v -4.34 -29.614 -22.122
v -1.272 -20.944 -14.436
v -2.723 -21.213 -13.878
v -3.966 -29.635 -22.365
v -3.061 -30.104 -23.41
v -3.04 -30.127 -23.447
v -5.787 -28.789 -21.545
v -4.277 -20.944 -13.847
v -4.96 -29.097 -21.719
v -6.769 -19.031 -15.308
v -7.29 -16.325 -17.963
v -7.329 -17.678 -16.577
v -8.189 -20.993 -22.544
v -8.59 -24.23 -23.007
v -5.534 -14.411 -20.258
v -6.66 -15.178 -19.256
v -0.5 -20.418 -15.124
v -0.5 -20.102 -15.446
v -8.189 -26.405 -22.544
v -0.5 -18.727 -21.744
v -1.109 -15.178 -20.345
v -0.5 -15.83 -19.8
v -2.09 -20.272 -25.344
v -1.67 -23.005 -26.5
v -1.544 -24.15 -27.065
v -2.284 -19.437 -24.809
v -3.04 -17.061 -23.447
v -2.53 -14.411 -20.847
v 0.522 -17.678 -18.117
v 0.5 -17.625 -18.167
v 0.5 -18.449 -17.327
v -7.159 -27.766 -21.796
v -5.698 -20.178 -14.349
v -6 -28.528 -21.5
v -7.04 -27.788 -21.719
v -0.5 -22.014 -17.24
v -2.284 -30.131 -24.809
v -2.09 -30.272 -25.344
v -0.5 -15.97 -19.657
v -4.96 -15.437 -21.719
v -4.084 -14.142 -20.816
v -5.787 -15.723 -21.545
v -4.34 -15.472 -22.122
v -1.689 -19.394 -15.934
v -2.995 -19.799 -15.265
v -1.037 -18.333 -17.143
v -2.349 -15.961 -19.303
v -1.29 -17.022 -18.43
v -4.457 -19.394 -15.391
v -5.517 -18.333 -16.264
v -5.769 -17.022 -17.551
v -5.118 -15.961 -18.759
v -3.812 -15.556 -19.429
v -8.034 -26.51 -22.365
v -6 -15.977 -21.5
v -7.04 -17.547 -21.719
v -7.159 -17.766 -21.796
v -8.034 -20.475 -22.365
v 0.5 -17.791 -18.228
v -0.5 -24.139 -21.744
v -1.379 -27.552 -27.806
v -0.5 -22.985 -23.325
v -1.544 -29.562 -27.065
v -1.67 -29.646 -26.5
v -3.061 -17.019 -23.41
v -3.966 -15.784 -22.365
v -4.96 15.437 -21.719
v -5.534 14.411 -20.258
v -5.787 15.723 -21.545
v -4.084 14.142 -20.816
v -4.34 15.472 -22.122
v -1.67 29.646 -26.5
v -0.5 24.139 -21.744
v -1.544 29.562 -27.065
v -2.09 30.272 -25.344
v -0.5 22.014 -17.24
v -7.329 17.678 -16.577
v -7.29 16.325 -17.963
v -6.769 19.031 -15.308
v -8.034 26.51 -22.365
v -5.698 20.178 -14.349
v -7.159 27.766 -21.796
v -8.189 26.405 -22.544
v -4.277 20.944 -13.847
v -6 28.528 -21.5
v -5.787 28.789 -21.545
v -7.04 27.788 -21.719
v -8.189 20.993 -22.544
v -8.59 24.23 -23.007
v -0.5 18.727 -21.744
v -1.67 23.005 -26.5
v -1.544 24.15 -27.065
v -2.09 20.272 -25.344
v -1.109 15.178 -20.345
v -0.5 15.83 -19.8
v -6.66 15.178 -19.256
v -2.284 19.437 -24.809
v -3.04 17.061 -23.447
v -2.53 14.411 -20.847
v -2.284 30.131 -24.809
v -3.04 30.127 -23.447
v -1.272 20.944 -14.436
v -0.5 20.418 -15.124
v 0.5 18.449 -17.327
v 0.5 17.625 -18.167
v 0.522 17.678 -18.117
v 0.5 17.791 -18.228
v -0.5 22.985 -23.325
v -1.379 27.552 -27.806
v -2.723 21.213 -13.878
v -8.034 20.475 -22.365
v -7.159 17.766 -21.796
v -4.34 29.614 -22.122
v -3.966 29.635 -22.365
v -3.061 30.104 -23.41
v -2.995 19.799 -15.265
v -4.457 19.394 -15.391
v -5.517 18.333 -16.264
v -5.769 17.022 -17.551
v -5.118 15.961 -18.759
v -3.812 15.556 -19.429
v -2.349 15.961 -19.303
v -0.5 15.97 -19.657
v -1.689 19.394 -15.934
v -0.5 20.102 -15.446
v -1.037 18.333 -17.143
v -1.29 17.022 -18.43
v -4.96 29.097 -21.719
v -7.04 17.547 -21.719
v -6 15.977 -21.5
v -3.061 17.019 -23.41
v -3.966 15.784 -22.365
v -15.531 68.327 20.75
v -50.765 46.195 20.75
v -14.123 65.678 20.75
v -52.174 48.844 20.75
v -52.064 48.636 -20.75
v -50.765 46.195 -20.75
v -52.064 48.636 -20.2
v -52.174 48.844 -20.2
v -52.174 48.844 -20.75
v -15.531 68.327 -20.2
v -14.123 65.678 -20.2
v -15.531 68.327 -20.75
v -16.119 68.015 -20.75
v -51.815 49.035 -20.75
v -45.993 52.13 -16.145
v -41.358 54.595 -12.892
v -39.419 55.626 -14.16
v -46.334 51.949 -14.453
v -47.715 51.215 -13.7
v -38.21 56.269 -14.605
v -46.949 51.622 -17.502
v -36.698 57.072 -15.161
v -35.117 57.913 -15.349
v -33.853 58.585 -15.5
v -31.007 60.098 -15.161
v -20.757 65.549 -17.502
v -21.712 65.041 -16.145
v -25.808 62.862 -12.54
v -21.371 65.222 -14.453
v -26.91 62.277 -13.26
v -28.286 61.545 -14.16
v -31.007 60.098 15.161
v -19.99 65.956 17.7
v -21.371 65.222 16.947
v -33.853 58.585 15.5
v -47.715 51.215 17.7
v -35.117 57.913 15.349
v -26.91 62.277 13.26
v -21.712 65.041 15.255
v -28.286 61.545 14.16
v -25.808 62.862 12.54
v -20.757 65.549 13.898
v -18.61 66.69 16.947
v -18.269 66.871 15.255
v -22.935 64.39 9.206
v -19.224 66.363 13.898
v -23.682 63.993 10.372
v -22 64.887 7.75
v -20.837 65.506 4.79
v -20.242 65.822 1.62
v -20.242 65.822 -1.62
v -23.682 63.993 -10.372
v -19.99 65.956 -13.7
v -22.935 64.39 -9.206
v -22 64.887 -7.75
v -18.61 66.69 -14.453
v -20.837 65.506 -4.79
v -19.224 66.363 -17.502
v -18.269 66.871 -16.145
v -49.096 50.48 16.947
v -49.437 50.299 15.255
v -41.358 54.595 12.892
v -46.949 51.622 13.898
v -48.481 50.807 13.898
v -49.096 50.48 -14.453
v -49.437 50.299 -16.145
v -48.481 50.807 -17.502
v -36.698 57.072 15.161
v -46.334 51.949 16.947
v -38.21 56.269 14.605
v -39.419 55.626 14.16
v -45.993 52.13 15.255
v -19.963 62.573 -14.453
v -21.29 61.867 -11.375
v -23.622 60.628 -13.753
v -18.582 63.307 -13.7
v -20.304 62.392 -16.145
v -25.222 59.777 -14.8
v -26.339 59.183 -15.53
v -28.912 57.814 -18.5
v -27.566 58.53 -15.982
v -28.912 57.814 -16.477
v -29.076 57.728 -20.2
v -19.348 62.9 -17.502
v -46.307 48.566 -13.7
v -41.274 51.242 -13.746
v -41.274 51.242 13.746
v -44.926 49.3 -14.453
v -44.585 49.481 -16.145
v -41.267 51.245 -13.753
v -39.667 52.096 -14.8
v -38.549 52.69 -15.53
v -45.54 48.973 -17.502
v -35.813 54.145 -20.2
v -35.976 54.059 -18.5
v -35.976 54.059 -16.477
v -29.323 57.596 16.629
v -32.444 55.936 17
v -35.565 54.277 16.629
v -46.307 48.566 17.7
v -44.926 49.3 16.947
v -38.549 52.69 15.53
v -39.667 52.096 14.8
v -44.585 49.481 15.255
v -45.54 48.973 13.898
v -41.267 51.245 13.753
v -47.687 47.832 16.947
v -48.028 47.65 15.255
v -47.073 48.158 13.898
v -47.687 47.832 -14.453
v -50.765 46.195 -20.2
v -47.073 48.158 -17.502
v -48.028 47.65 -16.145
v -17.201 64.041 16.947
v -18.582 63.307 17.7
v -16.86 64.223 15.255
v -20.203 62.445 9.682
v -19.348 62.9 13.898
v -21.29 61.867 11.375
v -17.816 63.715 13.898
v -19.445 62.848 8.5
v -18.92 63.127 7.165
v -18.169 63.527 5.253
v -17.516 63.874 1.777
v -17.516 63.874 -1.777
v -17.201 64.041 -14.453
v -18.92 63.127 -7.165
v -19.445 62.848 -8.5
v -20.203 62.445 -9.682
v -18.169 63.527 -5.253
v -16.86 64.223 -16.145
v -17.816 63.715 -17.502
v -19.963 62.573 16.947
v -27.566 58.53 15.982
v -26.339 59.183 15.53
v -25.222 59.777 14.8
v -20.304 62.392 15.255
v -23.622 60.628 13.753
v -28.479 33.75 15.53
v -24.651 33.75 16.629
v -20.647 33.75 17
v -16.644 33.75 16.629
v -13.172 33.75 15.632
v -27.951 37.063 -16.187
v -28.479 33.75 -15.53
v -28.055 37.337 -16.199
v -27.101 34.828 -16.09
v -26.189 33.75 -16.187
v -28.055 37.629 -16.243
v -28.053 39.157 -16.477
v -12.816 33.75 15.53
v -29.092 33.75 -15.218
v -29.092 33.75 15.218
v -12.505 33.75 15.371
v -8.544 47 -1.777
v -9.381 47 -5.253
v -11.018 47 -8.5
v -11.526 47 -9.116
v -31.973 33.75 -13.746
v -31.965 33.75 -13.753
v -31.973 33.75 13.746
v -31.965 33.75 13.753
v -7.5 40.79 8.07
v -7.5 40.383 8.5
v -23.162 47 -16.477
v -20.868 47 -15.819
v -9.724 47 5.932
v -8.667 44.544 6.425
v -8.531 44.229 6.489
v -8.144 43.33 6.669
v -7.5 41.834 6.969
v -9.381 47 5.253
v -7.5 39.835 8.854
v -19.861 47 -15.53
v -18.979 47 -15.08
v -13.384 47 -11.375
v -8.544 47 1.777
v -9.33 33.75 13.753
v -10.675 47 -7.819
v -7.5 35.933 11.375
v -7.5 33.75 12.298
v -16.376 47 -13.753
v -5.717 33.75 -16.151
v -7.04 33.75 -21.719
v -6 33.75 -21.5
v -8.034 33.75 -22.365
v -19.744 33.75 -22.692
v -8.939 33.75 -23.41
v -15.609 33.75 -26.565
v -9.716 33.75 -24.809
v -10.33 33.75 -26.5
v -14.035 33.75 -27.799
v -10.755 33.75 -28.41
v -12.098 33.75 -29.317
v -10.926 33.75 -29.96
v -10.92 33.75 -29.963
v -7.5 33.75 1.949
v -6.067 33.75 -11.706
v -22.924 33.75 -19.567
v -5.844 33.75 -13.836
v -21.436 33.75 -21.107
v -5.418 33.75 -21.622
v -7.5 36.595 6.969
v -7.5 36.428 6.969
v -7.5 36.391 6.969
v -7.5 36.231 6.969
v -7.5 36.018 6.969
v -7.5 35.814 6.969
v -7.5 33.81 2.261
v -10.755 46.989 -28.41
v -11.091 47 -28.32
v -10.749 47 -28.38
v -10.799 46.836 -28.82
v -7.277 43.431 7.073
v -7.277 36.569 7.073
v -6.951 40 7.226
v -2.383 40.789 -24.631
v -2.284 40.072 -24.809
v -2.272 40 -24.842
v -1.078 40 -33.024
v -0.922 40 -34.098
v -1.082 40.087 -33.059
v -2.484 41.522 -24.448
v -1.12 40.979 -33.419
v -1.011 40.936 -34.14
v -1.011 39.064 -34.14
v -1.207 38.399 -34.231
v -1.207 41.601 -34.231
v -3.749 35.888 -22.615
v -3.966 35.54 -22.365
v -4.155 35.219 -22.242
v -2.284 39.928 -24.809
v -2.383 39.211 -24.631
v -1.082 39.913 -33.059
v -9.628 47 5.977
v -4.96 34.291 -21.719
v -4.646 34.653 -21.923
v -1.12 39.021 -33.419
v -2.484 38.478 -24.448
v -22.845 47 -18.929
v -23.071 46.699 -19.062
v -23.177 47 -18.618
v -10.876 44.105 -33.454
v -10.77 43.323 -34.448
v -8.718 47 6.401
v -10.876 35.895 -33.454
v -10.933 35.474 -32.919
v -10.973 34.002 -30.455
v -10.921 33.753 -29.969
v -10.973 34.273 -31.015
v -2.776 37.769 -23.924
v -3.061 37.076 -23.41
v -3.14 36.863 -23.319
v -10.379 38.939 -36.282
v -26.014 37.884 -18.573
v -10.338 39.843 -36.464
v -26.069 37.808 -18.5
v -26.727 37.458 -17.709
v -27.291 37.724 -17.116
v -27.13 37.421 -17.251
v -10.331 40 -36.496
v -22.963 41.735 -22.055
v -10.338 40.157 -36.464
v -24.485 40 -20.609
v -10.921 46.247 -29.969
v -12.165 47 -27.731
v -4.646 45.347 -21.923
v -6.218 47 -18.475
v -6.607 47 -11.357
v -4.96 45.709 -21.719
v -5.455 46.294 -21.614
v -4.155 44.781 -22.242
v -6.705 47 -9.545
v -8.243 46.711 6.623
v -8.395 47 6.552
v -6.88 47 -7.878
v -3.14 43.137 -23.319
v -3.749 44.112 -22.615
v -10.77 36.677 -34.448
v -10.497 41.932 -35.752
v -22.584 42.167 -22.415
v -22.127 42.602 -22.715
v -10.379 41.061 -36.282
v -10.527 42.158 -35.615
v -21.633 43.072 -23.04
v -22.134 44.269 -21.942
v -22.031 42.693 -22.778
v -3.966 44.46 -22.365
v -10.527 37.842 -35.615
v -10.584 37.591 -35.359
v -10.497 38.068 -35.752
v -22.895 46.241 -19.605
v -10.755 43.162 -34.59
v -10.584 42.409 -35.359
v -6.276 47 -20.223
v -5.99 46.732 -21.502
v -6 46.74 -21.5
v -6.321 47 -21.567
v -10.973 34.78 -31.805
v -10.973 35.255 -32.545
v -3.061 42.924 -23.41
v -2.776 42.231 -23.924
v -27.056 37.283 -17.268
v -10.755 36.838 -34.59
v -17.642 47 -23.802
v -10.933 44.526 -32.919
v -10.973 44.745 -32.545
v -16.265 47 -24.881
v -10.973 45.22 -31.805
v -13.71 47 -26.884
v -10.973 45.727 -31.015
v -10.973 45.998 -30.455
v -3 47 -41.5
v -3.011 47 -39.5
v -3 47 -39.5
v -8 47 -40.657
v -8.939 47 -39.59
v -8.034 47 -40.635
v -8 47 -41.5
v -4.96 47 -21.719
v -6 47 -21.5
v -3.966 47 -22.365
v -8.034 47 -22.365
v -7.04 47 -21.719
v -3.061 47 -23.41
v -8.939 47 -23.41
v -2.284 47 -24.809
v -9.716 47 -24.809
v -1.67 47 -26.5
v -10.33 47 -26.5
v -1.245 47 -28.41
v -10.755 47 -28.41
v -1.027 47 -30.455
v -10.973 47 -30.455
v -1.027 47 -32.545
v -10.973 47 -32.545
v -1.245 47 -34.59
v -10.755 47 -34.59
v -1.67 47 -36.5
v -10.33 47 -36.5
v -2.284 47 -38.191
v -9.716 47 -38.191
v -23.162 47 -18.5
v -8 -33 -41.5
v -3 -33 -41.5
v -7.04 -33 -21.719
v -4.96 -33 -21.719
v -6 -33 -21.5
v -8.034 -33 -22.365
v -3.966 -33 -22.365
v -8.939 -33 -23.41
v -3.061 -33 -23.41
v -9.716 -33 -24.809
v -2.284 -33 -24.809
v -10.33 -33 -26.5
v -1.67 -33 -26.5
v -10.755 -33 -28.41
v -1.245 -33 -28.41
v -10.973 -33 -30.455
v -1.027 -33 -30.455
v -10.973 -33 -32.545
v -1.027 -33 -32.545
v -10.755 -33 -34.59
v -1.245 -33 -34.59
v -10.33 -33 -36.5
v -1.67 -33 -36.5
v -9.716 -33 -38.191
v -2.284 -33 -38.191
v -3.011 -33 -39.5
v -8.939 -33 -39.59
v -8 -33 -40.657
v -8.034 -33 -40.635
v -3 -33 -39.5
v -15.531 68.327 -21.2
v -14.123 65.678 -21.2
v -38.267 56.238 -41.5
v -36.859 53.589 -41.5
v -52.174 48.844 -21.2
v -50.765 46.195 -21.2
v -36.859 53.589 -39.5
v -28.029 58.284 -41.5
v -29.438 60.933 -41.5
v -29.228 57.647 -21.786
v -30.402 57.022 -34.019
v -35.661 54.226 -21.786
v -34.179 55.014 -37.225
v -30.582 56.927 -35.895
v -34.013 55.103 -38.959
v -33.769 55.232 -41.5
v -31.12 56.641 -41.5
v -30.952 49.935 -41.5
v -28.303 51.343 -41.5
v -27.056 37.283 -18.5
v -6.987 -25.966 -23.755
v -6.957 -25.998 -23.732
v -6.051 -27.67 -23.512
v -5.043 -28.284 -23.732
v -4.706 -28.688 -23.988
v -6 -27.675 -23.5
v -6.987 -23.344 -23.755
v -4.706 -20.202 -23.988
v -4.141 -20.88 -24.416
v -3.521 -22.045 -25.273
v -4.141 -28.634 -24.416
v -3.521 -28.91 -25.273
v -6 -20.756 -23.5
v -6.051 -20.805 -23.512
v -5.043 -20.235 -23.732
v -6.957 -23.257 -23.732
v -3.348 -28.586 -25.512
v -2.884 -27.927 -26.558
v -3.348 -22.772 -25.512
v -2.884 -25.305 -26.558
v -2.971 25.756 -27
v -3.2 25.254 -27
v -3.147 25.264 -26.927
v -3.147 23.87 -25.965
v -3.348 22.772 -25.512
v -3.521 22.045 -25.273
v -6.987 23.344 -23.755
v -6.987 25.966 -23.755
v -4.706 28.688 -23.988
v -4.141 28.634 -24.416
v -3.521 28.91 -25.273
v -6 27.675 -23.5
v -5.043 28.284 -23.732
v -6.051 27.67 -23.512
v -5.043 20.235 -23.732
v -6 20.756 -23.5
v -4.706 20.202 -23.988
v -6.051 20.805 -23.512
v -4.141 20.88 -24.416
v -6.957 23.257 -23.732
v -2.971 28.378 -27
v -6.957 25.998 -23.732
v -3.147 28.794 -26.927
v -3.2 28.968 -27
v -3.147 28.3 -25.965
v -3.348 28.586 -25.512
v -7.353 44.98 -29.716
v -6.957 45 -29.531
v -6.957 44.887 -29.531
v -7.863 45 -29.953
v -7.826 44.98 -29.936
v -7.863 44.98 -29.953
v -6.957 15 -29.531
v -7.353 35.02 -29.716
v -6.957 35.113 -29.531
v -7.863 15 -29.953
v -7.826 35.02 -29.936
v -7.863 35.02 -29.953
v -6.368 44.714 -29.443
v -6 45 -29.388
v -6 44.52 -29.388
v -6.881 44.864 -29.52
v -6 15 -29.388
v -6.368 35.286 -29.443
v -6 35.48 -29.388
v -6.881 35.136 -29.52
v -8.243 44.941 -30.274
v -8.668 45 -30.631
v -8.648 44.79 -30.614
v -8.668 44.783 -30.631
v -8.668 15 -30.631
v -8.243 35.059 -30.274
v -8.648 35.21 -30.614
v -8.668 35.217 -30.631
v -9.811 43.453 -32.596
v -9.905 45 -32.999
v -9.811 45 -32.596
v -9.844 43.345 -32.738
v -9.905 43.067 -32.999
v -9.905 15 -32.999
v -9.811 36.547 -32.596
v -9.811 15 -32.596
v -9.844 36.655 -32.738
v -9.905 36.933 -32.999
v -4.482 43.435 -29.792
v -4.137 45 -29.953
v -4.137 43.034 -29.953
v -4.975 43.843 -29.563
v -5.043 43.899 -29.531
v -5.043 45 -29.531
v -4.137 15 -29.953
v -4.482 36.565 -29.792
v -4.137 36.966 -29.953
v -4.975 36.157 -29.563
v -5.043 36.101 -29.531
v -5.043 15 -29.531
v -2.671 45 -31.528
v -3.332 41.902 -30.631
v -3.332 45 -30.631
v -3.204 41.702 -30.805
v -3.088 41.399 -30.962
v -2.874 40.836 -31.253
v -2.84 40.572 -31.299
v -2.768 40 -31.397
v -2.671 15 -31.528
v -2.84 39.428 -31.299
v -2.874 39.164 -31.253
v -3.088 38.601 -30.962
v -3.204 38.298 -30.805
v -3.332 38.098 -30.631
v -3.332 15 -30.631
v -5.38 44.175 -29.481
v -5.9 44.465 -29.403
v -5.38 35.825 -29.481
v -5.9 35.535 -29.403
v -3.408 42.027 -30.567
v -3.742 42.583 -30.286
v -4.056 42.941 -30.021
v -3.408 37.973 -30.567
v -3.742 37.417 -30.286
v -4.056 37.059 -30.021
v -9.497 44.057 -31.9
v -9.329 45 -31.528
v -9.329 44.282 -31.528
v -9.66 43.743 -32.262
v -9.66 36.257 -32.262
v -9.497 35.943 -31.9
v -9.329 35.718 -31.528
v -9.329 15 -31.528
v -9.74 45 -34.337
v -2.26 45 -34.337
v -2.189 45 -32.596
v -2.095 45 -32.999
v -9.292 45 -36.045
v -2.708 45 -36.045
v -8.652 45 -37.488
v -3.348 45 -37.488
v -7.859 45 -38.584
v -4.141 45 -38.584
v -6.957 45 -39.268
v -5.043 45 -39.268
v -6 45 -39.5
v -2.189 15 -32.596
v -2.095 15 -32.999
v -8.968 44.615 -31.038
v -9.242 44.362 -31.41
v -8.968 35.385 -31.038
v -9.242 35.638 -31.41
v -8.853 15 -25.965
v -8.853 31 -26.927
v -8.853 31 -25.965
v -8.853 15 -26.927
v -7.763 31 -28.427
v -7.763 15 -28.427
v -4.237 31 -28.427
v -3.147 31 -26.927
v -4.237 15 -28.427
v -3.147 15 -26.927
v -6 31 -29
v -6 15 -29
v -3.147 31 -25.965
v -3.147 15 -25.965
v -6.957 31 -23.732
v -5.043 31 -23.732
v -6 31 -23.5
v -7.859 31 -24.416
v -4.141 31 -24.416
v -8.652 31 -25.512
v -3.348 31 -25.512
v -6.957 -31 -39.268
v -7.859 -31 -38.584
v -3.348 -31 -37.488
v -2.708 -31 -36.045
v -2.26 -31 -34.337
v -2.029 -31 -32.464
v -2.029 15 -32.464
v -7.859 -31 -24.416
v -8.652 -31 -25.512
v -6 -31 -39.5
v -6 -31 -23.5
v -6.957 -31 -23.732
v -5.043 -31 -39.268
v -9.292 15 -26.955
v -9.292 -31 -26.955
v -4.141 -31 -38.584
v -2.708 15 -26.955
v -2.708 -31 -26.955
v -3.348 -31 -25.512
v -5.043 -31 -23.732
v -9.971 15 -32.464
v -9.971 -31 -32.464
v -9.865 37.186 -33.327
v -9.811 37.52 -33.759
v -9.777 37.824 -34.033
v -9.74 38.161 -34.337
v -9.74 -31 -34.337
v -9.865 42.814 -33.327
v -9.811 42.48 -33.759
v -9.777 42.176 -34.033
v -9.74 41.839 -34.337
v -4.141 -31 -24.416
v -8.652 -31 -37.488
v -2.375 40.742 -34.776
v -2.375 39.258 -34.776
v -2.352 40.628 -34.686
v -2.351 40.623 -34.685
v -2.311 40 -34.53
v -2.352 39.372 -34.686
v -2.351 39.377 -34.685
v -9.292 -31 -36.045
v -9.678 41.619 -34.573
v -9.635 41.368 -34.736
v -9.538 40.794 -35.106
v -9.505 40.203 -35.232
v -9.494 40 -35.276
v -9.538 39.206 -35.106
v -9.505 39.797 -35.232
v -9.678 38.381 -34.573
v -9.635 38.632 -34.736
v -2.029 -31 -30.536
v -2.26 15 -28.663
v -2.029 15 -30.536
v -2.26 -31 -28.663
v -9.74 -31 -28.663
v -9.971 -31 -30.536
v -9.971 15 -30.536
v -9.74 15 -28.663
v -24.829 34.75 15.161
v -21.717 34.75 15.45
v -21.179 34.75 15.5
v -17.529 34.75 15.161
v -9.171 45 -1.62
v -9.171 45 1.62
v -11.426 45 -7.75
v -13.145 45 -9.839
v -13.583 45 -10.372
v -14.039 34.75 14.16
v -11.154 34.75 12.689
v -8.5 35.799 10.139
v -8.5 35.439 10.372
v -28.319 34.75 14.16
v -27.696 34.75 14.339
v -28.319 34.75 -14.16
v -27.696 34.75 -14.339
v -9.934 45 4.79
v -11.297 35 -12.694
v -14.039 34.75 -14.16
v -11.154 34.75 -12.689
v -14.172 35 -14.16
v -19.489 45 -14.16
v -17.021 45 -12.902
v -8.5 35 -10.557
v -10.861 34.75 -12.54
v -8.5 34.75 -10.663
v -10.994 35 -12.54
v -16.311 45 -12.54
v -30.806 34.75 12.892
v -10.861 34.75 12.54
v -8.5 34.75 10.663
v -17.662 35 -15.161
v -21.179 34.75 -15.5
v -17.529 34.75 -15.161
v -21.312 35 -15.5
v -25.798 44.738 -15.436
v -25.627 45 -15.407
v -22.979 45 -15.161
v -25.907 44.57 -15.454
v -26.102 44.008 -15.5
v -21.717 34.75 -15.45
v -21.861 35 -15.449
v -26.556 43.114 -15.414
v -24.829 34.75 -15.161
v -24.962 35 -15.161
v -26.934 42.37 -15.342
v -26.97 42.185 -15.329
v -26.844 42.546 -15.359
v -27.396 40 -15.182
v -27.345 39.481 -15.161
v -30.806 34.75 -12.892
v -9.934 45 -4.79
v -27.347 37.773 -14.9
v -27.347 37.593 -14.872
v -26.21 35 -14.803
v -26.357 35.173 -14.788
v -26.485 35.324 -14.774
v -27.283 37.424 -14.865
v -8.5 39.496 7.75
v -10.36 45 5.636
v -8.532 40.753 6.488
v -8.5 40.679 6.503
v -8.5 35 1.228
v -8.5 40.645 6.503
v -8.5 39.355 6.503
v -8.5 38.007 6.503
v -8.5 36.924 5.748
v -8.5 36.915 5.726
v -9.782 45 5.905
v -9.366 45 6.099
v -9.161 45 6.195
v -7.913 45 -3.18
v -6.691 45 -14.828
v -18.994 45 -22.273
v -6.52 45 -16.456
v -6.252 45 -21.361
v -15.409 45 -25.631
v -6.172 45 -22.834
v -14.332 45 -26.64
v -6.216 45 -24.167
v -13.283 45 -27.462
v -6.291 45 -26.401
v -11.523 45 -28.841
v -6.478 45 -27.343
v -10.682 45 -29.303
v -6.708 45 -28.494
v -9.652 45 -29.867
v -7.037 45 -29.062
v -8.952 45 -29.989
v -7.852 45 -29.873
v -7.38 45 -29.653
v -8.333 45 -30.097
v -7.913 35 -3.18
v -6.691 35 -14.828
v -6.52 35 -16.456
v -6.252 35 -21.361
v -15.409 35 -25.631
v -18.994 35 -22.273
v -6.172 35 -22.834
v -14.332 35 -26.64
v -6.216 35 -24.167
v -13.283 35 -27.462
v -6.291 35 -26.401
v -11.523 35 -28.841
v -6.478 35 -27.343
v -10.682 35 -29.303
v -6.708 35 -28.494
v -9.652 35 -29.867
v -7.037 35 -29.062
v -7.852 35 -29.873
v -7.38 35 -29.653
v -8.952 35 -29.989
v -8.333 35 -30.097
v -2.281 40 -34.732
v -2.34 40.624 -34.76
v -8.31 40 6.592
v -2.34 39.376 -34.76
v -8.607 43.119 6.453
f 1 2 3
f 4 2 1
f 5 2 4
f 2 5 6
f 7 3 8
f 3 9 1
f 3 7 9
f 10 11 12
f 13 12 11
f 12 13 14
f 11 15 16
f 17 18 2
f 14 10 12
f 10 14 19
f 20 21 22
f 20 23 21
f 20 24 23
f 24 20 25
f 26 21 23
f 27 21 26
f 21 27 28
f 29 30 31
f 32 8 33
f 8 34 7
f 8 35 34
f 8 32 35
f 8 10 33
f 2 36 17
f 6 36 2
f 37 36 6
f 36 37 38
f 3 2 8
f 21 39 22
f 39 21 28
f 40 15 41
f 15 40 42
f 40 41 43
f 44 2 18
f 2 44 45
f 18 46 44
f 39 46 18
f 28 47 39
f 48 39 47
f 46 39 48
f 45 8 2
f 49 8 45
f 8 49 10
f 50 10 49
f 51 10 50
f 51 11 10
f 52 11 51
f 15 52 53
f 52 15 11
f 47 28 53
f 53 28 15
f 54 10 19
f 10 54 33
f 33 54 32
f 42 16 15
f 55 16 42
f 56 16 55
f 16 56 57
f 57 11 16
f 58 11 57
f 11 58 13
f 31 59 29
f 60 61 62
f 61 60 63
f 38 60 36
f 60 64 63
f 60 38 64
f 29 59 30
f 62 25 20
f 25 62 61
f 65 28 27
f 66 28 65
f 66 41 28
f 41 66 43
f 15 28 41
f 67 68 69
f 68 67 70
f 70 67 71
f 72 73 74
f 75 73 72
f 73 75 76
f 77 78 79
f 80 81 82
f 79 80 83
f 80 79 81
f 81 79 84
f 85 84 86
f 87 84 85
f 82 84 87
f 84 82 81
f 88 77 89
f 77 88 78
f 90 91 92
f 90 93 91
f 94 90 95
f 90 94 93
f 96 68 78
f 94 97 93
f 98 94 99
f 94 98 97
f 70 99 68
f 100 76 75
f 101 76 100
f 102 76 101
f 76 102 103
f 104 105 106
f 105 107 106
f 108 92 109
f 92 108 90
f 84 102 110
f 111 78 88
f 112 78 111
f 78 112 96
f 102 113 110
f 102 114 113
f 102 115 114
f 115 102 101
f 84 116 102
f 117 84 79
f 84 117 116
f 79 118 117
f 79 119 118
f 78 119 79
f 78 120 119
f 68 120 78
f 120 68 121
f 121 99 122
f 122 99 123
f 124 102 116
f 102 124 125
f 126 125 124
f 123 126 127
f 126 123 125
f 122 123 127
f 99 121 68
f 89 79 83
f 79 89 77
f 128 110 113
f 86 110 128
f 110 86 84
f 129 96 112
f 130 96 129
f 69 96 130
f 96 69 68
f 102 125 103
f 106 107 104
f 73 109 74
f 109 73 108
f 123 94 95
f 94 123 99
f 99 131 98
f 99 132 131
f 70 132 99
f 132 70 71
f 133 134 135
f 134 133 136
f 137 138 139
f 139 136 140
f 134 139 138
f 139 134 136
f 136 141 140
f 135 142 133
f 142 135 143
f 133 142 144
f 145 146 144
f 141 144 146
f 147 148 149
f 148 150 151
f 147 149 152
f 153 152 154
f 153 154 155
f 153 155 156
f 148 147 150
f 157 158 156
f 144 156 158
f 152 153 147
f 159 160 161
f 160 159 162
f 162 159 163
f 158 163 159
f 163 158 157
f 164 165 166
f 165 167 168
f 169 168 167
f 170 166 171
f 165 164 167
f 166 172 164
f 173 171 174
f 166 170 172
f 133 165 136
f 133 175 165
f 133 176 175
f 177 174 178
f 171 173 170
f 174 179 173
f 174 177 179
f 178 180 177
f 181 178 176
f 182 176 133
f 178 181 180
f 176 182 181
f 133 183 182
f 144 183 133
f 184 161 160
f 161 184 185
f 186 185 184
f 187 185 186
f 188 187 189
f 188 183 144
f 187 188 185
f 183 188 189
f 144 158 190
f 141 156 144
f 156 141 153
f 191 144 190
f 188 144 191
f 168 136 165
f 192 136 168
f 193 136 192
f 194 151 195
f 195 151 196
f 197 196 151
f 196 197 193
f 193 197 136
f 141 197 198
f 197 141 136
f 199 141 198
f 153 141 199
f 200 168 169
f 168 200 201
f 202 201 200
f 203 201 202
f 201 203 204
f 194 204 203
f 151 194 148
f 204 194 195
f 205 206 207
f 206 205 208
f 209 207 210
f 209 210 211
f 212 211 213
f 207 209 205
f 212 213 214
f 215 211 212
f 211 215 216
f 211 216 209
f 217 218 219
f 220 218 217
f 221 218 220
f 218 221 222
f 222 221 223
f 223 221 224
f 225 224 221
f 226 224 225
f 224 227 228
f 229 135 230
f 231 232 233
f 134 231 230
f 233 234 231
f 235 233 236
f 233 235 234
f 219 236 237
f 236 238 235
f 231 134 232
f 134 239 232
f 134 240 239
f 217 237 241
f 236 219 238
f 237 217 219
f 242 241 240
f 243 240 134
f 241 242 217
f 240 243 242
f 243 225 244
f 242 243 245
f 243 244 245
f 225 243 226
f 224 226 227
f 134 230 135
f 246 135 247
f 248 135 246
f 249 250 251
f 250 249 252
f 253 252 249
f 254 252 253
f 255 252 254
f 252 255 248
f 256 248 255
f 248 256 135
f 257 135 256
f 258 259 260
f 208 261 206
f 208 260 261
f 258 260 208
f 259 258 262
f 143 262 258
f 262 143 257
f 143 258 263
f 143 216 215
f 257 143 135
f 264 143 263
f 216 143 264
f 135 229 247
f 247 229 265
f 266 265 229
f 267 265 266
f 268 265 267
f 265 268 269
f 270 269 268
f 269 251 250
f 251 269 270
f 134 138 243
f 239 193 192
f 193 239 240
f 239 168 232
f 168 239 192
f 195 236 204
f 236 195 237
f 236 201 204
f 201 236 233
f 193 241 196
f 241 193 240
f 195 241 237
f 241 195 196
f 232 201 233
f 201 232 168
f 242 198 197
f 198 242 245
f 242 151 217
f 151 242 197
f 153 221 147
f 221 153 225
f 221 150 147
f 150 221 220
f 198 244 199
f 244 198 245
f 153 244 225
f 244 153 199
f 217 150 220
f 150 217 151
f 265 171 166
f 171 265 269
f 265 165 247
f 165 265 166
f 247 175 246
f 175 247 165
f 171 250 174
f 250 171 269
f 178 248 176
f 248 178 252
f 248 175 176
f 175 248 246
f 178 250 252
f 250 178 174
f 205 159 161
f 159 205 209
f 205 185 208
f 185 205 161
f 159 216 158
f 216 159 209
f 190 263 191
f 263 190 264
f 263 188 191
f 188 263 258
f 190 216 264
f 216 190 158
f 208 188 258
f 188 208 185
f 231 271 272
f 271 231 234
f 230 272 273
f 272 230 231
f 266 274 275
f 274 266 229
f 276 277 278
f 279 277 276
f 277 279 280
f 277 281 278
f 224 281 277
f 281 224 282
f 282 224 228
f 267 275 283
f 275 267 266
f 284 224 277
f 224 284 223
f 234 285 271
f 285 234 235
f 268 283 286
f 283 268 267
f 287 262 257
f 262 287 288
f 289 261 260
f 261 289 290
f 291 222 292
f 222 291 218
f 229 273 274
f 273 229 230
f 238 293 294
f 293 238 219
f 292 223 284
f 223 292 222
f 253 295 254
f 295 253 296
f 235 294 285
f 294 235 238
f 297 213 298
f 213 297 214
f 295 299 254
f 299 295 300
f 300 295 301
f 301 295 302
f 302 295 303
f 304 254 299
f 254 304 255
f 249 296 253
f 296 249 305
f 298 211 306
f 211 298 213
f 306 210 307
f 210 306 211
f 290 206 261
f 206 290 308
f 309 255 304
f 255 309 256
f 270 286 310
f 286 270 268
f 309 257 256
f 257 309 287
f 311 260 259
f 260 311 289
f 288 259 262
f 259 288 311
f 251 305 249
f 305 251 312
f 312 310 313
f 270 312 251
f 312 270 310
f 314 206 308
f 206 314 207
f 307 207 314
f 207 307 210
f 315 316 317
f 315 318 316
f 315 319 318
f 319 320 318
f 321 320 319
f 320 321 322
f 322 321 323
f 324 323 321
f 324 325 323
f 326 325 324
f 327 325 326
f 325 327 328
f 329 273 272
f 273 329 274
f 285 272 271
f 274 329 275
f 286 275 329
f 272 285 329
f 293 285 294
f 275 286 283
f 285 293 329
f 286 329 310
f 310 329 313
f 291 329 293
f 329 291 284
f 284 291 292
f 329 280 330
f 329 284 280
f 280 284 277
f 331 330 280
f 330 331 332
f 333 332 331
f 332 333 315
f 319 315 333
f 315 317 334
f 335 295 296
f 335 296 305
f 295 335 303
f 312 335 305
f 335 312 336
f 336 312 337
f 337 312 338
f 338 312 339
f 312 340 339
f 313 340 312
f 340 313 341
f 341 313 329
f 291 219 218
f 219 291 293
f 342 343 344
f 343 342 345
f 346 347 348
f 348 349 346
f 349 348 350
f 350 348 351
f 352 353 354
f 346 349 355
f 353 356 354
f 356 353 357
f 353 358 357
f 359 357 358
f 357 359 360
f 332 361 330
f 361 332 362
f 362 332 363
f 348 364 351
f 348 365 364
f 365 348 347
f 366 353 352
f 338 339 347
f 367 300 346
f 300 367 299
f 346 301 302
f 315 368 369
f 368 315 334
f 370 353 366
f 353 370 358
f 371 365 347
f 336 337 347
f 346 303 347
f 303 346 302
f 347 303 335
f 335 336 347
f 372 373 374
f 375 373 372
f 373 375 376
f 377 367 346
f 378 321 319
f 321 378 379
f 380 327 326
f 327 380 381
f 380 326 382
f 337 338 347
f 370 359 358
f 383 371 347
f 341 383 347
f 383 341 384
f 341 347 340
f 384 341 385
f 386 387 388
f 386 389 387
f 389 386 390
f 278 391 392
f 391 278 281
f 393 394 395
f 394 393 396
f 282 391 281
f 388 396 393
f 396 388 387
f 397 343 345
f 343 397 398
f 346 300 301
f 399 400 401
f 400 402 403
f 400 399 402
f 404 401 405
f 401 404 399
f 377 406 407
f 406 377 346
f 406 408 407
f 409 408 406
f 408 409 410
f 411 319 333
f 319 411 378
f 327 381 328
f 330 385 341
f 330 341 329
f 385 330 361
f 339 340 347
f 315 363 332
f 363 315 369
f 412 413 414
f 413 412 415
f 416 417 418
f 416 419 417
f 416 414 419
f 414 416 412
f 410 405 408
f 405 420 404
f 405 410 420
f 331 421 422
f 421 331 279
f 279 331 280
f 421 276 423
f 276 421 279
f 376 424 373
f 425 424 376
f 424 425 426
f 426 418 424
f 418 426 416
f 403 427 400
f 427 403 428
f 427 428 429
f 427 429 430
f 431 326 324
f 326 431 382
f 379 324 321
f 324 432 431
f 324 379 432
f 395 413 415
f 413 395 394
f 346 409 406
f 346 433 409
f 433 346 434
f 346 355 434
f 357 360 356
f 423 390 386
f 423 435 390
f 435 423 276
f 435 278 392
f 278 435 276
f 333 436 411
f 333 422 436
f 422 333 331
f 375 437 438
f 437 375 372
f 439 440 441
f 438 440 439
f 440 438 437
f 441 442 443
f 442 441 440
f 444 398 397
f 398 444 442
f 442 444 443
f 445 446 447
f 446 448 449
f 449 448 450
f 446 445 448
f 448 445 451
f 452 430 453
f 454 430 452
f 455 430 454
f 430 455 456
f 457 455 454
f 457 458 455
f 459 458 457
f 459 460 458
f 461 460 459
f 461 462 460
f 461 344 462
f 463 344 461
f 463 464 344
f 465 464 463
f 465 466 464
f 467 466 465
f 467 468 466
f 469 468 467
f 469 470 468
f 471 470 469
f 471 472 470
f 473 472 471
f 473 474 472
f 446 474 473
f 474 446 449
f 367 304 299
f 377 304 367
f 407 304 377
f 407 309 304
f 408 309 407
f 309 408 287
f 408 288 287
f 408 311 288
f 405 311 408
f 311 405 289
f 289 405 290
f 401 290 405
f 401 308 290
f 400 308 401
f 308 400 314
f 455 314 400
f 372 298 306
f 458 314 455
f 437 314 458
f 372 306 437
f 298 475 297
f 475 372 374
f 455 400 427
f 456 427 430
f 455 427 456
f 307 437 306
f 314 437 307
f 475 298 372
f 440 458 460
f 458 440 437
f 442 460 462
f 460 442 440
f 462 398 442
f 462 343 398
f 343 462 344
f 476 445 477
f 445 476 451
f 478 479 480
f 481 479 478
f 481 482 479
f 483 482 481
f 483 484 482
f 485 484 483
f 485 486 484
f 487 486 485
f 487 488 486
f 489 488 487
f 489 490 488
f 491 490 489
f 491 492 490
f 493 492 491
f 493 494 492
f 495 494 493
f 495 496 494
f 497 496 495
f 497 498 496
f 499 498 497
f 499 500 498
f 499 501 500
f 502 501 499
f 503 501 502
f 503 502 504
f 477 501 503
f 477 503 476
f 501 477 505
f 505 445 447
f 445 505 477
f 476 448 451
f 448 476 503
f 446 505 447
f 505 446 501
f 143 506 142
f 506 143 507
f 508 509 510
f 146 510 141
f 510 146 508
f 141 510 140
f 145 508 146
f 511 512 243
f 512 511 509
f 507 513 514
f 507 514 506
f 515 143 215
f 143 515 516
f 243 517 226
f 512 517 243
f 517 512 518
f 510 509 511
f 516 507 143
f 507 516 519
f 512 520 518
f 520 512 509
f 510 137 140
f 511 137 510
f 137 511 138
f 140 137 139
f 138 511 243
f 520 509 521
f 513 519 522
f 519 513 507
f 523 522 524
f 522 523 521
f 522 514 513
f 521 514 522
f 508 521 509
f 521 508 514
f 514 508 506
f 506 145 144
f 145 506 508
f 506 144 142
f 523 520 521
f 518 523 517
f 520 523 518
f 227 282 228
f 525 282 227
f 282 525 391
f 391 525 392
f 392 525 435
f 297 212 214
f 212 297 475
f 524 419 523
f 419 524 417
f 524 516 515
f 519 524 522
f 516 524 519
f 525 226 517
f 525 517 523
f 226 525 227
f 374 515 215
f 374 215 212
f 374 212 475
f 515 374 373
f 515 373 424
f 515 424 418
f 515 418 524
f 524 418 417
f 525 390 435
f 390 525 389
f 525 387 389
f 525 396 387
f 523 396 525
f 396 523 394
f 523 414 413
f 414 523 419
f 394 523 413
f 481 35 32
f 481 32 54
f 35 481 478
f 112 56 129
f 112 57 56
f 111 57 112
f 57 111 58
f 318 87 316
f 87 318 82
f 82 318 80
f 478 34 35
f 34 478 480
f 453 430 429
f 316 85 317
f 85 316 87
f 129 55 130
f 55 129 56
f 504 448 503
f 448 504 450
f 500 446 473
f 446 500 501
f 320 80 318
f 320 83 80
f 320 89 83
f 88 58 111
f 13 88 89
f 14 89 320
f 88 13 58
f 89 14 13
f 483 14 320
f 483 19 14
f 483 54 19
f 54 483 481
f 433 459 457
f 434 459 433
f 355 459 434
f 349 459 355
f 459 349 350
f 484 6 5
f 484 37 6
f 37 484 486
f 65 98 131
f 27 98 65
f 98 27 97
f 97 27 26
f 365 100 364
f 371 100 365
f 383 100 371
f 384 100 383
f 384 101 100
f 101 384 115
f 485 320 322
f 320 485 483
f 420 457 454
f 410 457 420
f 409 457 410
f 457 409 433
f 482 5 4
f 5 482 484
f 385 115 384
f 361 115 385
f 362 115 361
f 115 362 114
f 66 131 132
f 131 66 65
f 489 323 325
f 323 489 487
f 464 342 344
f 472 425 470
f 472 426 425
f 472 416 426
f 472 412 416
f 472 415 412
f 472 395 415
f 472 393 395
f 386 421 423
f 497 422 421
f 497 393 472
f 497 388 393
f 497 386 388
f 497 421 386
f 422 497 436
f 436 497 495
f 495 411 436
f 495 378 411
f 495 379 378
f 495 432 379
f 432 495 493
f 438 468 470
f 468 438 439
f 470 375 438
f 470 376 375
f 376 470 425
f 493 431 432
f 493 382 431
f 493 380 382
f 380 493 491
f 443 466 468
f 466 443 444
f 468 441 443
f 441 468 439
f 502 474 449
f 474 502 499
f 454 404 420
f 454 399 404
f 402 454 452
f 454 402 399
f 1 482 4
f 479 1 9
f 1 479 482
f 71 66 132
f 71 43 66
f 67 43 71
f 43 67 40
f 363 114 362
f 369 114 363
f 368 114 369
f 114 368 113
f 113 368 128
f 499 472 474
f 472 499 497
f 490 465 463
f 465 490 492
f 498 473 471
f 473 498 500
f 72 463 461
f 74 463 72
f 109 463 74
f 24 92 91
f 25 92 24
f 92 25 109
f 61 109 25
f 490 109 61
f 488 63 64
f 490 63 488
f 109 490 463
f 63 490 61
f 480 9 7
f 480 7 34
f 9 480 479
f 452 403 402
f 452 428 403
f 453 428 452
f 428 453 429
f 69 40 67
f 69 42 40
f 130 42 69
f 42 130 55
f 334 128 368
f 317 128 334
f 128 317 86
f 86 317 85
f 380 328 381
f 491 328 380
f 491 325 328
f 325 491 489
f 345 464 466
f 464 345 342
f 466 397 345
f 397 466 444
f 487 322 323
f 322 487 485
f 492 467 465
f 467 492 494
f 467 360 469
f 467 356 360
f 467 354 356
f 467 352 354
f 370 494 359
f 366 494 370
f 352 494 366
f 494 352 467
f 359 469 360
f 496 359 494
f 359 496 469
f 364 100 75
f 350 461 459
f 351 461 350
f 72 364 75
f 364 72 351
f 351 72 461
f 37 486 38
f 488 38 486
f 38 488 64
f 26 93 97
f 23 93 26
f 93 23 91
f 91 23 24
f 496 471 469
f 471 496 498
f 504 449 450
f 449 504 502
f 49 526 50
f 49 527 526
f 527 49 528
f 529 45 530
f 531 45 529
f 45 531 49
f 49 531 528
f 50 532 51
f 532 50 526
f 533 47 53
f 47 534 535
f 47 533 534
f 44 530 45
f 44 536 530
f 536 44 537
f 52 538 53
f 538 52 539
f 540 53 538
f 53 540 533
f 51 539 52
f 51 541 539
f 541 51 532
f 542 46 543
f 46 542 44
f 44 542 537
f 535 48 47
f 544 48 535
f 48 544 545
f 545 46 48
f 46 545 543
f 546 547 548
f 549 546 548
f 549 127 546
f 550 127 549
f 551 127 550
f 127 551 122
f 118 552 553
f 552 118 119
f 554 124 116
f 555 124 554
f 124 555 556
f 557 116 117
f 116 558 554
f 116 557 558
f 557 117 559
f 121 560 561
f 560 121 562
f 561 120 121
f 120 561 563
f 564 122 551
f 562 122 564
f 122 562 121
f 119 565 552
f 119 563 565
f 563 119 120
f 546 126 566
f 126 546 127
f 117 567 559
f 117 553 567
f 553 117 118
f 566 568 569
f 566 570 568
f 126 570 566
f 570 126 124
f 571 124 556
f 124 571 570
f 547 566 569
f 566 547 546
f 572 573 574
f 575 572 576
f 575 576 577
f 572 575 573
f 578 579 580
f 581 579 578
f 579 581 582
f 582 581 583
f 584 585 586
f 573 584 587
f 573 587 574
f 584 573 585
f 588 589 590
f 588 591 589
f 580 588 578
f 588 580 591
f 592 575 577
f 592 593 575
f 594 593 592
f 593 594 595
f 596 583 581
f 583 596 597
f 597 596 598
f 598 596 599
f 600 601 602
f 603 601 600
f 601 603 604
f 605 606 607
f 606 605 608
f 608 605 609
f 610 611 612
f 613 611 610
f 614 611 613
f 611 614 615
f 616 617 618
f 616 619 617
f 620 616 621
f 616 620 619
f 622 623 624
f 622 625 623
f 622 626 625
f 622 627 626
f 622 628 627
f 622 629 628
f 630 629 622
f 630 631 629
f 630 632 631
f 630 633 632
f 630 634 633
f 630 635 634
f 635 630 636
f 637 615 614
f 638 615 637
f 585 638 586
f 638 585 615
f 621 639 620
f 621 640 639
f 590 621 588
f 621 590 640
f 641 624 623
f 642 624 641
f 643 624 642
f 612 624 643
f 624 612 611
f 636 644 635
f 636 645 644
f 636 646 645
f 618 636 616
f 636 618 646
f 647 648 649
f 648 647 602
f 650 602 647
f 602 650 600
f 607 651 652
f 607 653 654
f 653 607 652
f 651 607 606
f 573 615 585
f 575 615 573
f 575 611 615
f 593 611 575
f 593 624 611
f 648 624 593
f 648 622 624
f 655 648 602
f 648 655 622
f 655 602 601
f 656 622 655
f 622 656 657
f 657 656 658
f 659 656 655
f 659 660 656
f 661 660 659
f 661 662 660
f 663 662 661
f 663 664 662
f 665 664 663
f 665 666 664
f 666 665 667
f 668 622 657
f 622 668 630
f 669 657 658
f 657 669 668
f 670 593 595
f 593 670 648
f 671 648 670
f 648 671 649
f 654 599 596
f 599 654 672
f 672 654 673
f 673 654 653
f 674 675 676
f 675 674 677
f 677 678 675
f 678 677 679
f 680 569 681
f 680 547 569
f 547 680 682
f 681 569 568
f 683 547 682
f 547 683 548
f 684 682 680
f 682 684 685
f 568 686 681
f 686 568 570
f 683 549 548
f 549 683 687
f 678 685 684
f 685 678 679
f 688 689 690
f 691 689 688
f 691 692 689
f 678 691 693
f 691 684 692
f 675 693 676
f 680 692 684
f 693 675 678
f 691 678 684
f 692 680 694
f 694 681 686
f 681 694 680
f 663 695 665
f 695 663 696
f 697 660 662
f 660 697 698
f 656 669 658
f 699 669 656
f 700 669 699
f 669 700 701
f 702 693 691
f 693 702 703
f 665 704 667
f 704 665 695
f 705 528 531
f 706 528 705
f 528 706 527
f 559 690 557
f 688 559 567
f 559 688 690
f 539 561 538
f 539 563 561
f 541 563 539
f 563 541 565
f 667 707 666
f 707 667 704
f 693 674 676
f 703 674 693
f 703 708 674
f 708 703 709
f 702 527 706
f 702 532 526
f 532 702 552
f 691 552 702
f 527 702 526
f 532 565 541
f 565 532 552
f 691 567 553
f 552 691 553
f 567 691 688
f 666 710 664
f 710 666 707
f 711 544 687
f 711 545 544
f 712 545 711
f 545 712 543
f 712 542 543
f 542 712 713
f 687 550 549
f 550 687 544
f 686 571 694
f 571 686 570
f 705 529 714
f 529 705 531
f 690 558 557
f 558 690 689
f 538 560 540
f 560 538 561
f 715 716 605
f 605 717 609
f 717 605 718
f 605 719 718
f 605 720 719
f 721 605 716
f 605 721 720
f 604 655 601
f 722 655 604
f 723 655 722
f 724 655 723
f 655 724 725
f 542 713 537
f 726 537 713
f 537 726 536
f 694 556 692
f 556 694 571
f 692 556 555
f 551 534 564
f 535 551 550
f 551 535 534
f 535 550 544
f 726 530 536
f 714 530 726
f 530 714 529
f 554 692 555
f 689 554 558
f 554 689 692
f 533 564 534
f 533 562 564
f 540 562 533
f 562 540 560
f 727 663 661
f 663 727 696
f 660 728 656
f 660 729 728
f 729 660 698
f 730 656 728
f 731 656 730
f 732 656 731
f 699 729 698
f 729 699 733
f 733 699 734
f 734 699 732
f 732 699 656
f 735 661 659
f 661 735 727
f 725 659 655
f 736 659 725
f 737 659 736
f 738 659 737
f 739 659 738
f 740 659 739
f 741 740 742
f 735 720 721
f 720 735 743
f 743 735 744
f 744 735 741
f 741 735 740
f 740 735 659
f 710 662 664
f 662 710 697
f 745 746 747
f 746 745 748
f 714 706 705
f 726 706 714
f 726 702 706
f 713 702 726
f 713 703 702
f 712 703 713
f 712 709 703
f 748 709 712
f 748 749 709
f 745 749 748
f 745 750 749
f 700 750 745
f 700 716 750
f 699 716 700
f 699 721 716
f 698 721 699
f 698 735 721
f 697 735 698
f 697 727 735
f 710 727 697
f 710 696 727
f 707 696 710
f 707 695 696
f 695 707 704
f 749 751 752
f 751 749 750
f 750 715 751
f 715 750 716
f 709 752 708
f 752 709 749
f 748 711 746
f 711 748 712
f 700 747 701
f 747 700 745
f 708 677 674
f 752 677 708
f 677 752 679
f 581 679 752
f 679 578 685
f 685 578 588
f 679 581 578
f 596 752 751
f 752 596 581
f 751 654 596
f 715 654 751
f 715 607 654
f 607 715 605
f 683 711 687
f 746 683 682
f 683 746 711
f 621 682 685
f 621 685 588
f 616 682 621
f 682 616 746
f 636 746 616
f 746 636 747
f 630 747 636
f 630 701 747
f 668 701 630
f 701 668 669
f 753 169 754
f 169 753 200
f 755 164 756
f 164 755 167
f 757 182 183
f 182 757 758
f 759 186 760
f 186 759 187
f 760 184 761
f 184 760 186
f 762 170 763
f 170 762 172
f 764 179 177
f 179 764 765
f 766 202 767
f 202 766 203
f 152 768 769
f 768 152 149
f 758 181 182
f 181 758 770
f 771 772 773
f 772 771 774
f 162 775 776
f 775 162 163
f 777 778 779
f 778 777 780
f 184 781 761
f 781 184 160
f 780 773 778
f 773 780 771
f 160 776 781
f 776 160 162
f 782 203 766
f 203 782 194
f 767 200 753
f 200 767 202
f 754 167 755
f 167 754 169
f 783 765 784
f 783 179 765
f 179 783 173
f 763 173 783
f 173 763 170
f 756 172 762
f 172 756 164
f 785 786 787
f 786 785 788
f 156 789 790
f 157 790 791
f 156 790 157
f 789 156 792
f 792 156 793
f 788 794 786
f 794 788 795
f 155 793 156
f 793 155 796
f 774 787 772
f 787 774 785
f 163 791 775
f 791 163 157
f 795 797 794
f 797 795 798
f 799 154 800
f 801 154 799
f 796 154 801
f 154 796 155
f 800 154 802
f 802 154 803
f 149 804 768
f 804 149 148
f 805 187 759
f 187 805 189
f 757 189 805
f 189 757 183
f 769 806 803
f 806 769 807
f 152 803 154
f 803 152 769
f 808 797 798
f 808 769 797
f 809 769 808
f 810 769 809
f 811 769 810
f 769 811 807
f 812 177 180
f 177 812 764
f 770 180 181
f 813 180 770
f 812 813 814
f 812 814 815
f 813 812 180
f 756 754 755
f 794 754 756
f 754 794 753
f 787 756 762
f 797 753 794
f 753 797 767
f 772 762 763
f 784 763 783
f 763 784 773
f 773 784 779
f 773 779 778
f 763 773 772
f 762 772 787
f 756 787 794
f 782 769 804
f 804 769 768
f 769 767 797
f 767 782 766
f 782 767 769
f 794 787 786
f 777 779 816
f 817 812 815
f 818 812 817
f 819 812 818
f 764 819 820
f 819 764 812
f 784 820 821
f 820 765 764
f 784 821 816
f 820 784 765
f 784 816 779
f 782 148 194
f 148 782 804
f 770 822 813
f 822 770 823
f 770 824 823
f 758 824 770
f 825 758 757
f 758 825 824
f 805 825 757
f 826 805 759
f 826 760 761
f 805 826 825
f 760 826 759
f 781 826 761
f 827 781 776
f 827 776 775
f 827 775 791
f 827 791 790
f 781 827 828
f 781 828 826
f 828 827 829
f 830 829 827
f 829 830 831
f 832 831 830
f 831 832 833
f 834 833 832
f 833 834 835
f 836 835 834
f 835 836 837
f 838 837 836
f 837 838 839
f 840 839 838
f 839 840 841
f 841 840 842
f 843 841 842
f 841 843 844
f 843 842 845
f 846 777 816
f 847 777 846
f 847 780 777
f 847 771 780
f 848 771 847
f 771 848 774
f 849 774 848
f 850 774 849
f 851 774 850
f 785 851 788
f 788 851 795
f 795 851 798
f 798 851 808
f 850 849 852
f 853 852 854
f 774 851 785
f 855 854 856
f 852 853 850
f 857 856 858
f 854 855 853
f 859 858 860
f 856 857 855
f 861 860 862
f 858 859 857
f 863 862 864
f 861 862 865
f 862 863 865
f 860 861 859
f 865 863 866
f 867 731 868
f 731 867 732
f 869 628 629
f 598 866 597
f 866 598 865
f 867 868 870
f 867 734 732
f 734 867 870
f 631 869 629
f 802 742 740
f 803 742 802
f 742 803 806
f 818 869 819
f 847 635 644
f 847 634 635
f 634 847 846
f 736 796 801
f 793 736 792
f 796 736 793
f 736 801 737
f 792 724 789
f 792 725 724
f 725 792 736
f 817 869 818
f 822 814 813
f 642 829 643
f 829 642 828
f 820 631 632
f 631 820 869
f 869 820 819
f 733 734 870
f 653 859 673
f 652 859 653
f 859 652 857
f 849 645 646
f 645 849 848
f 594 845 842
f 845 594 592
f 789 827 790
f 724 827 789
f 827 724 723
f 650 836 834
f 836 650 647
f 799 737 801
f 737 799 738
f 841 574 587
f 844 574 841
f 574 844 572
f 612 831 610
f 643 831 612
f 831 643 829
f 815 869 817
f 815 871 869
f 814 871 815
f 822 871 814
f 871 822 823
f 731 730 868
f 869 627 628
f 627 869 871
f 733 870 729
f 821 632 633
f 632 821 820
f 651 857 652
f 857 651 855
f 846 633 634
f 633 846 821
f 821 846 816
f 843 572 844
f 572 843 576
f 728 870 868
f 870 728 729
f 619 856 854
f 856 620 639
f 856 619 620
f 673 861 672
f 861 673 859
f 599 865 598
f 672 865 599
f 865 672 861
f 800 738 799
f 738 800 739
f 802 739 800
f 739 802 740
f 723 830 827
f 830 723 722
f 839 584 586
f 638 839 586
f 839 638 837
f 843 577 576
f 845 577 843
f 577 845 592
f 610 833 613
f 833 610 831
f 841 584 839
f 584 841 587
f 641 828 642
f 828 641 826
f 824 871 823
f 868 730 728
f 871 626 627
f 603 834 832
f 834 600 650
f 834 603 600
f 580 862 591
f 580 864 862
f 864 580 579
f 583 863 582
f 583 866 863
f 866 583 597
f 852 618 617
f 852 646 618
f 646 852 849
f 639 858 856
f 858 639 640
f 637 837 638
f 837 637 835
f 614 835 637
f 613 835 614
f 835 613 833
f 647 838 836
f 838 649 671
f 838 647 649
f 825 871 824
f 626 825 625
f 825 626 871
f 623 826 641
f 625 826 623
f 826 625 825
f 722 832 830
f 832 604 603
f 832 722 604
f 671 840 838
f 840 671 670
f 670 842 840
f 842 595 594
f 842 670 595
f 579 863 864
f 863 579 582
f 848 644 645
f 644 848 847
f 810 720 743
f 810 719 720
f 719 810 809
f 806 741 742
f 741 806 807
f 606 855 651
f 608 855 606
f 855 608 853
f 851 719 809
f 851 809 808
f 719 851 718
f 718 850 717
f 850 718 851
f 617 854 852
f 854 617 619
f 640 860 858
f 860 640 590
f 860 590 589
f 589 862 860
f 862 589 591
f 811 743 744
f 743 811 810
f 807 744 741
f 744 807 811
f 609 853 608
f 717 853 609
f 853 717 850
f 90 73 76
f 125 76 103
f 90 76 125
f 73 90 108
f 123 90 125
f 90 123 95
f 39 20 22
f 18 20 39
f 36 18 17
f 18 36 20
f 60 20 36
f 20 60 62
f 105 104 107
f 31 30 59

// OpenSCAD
module nose(){
	scale([1,0.8,1])  cylinder(16 ,r=3);
}


module noses(){
	difference(){
		rotate([0,11.1,0]){
			rotate([90,0,-45]) translate([0,0,24]) nose();
			rotate([90,0,-45-90]) translate([0,0,24]) nose();
		}
		translate([-47,-50,0]) cube([20,100,50]);
	}
}

module channel_out(){
	translate([-31.5,15,6])rotate([90,0,0]) scale([1,0.5,1]) 
		cylinder(46,r=8);
	intersection(){
		union(){
			translate([-34.7,45,6])rotate([90,0,0]) scale([0.64,0.5,1]) 
				cylinder(31,r=8.3);	
			translate([-26,31,6])rotate([90,0,0]) //scale([1,0.5,1]) 
				cylinder(20,r=3);
		}
		translate([-31.5,46,6])rotate([90,0,0]) scale([1,0.5,1]) 
			cylinder(76,r=8);
	}
}

module channel_in(){

	difference(){
		translate([0,63,36.2]) rotate([118,0,0])
			cylinder(90,r=15.5,center=true);
		cube([100,69.5,100],center=true);
		cube([100,100,17],center=true);

		#translate([0,63,36.2]) rotate([118,0,0])
			translate([-50,8.5,-50])cube([100,40,100]);

	}

	difference(){
		intersection(){
			translate([0,40,0]) cube([100,10,100],center=true);
		
			translate([-36,40,5]) rotate([0,65,0]) cylinder(40,r1=3,r2=15);
		}
		translate([0,63,36.2]) rotate([118,0,0])
			translate([-50,8.5,-50])cube([100,40,100]);

	}		
}


module inner(){
	noses();
	channel_out();
	channel_in();
}

module nose_body(){
	scale([1,0.8,1]) cylinder(15 ,r=5);
}

module noses_body(){
	rotate([0,11.1,0]){
		rotate([90,0,-45]) translate([0,0,25]) nose_body();
		rotate([90,0,-45-90]) translate([0,0,25]) nose_body();
	}
}

module channel_body(){
	translate([-31.5,47,6])rotate([90,0,0]) scale([1,0.5,1]) 
		cylinder(80,r=10);
	//translate([-41.5,47,1])rotate([90,0,0]) 
		//cube([3,10,80]);
}

module fan_frame(){
	translate([0,63,36.2]) rotate([28,0,0])
	difference(){
		translate([0,-6.5,0])cube([41.5,3,41.5],center=true);
//		rotate([90,0,0])cylinder(20,r=15.5,center=true);
		translate([15.7,0,15.7])rotate([90,0,0])cylinder(20,r=2,center=true);
		translate([-15.7,0,15.7])rotate([90,0,0])cylinder(20,r=2,center=true);
		translate([15.7,0,-15.7])rotate([90,0,0])cylinder(20,r=2,center=true);
		translate([-15.7,0,-15.7])rotate([90,0,0])cylinder(20,r=2,center=true);
	}
}

module tube(){
	difference(){
		translate([0,63,36.2]) rotate([118,0,0])
			cylinder(90,r=17,center=true);
		cube([100,67.5,100],center=true);
		cube([100,100,15],center=true);
	

		translate([0,63,36.2]) rotate([28,0,0])
			translate([0,42.5,0])cube([41.5,100,41.5],center=true);	
	

		#translate([0,63,36.2]) rotate([118,0,0])
			translate([-50,10,-50])cube([100,40,100]);
	}
}

module cone(){
	difference(){
		//translate([0,41,0]) cube([100,14,100],center=true);
	
		translate([-36,40,5]) rotate([0,65,0]) cylinder(40,r1=4.5,r2=16.5);

		cube([100,67.5,100],center=true);
		translate([0,67,0]) cube([100,40,100],center=true);

		translate([0,63,36.2]) rotate([118,0,0])
			translate([-50,9,-50])cube([100,40,100]);

	}
}

module support(){
	translate([-41.5,47,3])rotate([90,0,0]) 
		cube([2,5,80]);

	hull(){
		translate([0,63,36.2]) rotate([28,0,0])
			translate([-20.7,-6.5,0]) cube([1,3,41.5],center=true);
	
		intersection(){
			translate([0,63,36.2]) rotate([28,0,0])
				translate([-40,-6.5,0]) cube([10,3,10],center=true);
			translate([-41.5,147,3])rotate([90,0,0]) 
				cube([2,200,200]);
		}
	}

	hull(){

		translate([0,63,36.2]) rotate([118,0,0])
			translate([-17,0,17])cube([3,8,20],center=true);
//			cylinder(90,r=17,center=true);

	
		intersection(){
			translate([0,63,36.2]) rotate([118,0,0])
				translate([-37,0,10])cube([20,3,8],center=true);
			translate([-41.5,147,3])rotate([90,0,0]) 
				cube([2,200,200]);
		}
	}


}

module outer(){
	
	noses_body();
	channel_body();

	fan_frame();
	tube();
	cone();
	
	support();


}

module base(){

	#translate([-50,27.5,30.5])rotate([90,0,90]) cylinder(100,r=2.5);
	#translate([-8,-8,3])cube([20,16,10]);

	#translate([0,48,46]){
		translate([15.7,0,0])rotate([28,0,0])difference(){
			cube([8,2,8],center=true);
			rotate([90,0,0])cylinder(10,r=2,center=true);
		}
		translate([-15.7,0,0])rotate([28,0,0])difference(){
			cube([8,2,8],center=true);
			rotate([90,0,0])cylinder(10,r=2,center=true);
		}	
	}

}

module fan(){
	#translate([0,63,36.2]) rotate([28,0,0])
	difference(){
		cube([41.5,10,41.5],center=true);
		rotate([90,0,0])cylinder(20,r=15.5,center=true);
		translate([15.7,0,15.7])rotate([90,0,0])cylinder(20,r=2,center=true);
		translate([-15.7,0,15.7])rotate([90,0,0])cylinder(20,r=2,center=true);
		translate([15.7,0,-15.7])rotate([90,0,0])cylinder(20,r=2,center=true);
		translate([-15.7,0,-15.7])rotate([90,0,0])cylinder(20,r=2,center=true);
	}
}

//base();
//fan();

//fan_frame();

rotate([0,-90,0])
difference(){
	outer();
	inner();

	cube([1000,1000,1],center=true);
}
